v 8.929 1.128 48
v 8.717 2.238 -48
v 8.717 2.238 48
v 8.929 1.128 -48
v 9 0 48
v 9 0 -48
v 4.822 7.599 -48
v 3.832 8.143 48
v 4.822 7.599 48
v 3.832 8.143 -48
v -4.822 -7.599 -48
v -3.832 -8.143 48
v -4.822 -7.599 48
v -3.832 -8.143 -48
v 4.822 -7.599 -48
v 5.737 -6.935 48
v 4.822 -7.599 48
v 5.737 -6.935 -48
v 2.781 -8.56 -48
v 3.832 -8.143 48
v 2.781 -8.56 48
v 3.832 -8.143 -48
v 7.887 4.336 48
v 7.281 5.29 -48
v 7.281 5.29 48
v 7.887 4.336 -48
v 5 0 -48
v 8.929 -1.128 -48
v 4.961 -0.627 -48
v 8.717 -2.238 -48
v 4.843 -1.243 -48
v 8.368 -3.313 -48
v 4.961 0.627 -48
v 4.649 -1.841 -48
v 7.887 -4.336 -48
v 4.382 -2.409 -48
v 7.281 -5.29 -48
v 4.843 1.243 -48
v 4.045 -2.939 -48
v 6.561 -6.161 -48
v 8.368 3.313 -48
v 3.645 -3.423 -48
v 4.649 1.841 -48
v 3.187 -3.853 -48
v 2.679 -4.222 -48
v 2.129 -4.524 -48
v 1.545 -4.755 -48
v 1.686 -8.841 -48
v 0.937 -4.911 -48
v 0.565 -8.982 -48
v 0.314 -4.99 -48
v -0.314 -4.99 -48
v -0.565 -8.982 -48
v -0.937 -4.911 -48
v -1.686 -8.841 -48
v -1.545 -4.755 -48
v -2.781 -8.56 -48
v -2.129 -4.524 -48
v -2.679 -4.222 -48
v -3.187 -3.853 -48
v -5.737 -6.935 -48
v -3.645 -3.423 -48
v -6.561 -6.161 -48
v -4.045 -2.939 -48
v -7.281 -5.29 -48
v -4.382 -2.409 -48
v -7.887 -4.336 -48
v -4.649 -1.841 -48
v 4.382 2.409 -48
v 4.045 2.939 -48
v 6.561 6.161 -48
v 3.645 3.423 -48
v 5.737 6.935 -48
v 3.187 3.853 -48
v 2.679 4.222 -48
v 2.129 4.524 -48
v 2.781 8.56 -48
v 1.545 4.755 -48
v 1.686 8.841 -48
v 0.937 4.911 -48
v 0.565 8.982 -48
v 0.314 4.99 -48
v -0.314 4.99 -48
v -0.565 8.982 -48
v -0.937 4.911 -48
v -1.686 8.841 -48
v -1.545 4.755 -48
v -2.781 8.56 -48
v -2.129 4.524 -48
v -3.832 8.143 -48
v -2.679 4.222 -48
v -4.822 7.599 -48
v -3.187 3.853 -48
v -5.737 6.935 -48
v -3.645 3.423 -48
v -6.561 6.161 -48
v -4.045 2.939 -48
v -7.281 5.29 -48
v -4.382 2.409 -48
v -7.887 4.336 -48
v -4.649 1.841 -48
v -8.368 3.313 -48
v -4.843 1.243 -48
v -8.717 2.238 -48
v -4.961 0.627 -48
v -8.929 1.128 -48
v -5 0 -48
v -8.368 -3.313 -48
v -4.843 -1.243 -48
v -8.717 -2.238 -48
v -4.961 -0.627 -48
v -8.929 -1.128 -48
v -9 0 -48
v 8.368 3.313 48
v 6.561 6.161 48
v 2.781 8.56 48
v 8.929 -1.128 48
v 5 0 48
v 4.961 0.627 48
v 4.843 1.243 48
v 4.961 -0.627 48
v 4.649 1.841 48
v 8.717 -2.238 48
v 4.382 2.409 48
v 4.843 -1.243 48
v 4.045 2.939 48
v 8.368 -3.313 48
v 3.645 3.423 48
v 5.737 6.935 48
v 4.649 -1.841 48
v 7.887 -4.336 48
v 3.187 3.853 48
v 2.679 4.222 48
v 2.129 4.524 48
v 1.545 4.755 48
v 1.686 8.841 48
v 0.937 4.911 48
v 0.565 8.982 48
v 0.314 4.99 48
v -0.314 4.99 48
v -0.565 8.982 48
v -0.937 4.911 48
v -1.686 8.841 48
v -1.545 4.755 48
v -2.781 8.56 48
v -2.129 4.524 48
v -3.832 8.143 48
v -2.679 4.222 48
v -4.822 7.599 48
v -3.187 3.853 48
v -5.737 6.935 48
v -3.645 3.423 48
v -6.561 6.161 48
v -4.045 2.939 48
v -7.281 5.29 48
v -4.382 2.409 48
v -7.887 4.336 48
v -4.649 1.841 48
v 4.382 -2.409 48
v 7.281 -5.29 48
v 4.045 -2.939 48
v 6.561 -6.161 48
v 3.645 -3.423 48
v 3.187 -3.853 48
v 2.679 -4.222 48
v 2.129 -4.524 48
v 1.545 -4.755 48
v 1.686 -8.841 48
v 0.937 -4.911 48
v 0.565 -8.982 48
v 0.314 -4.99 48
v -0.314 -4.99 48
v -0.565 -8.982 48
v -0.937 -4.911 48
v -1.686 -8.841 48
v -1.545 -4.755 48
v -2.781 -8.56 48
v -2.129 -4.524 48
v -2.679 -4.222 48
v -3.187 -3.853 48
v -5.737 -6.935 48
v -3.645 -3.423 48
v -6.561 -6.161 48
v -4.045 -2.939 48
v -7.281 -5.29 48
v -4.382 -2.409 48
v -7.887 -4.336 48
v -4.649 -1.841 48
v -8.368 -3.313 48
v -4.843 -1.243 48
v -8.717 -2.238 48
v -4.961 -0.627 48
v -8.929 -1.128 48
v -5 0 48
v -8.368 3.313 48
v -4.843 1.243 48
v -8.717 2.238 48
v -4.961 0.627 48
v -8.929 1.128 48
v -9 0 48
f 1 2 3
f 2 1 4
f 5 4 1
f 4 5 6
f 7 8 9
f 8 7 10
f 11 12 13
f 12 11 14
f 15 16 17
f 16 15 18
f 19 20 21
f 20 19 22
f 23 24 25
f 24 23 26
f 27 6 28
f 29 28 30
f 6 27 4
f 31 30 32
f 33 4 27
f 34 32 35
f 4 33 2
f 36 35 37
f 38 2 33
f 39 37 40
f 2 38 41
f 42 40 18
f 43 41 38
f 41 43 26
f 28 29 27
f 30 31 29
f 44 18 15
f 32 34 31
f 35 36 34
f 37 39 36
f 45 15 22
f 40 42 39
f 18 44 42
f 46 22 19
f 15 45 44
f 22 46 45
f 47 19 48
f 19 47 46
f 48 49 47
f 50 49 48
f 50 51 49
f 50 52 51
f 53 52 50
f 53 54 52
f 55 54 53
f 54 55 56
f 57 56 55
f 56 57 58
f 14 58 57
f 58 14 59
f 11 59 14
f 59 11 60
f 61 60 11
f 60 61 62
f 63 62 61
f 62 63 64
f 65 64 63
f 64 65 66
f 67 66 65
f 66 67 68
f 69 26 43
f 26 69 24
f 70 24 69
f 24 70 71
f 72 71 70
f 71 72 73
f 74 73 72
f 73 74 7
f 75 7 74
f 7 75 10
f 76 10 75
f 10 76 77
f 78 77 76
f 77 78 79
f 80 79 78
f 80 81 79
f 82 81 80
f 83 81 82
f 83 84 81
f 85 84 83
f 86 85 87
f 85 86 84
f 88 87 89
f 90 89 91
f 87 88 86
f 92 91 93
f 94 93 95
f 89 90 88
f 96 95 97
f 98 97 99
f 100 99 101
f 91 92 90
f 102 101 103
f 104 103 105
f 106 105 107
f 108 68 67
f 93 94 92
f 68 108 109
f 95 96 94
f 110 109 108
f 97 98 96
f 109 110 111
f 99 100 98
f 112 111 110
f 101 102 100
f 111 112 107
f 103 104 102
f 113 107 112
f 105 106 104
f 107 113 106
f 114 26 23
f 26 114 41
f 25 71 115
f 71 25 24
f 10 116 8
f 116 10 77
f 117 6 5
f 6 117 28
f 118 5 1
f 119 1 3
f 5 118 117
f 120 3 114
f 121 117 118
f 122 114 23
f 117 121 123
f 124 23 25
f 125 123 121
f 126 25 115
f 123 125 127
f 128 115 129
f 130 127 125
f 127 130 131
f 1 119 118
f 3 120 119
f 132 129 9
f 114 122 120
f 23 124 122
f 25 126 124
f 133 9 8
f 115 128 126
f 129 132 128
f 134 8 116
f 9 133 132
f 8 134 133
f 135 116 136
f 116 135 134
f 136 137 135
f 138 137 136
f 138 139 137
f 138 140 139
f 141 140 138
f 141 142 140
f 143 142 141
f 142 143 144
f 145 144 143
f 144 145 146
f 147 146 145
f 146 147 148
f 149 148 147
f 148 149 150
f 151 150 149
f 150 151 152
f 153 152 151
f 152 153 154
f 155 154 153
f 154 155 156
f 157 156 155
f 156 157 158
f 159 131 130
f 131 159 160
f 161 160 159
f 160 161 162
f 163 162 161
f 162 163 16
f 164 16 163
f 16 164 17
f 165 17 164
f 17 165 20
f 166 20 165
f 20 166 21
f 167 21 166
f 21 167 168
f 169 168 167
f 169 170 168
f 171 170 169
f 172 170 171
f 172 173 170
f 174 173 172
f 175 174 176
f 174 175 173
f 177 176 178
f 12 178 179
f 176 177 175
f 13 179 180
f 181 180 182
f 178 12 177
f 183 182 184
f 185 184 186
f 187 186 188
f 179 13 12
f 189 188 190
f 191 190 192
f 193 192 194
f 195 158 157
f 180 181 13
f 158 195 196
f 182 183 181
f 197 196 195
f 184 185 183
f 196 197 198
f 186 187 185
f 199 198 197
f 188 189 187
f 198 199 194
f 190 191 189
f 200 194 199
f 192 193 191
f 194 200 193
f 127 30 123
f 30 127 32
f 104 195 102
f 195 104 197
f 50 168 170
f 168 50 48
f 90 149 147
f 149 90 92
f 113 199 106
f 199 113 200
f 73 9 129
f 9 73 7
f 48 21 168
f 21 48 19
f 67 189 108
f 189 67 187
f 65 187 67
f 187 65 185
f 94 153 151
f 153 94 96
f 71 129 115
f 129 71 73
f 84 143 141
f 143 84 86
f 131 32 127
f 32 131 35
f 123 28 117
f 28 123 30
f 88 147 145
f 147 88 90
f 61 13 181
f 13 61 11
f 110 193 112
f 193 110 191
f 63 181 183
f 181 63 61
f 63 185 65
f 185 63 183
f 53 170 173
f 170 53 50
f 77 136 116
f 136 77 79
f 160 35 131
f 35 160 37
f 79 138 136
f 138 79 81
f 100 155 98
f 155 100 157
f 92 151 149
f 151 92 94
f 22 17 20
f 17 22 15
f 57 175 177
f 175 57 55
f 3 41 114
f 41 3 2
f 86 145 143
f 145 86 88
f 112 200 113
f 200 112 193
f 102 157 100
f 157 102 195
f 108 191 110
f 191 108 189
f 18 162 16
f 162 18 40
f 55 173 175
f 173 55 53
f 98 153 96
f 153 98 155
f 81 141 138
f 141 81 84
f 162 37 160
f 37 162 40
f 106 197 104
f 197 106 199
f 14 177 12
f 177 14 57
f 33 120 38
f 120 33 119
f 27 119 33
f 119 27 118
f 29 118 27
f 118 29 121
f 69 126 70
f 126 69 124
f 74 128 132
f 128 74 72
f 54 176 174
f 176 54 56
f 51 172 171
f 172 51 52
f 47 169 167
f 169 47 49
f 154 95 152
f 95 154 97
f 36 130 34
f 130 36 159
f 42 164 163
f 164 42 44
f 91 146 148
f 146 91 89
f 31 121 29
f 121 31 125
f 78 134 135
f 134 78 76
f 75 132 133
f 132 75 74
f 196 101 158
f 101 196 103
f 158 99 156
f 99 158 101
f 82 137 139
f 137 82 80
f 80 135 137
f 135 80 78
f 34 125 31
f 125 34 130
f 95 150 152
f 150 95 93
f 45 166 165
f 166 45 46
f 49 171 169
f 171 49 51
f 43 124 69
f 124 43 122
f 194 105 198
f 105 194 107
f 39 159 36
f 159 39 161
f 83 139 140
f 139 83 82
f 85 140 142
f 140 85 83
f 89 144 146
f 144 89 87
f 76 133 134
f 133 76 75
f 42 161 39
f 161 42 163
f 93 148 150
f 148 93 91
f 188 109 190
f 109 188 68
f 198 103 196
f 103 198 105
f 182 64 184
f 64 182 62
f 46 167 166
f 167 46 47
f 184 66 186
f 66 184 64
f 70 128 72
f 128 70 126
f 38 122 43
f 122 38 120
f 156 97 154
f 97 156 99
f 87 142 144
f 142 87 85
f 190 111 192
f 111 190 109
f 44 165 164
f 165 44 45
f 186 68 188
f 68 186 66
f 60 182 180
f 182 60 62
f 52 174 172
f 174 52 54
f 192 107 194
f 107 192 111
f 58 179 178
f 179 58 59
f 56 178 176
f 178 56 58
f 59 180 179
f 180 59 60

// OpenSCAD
$fn = 50;


difference() {
	union() {
		translate(v = [0, 0, -48.0000000000]) {
			cylinder(h = 96, r = 9.0000000000);
		}
	}
	union() {
		translate(v = [0, 0, -100.0000000000]) {
			cylinder(h = 200, r = 5.0000000000);
		}
	}
}
